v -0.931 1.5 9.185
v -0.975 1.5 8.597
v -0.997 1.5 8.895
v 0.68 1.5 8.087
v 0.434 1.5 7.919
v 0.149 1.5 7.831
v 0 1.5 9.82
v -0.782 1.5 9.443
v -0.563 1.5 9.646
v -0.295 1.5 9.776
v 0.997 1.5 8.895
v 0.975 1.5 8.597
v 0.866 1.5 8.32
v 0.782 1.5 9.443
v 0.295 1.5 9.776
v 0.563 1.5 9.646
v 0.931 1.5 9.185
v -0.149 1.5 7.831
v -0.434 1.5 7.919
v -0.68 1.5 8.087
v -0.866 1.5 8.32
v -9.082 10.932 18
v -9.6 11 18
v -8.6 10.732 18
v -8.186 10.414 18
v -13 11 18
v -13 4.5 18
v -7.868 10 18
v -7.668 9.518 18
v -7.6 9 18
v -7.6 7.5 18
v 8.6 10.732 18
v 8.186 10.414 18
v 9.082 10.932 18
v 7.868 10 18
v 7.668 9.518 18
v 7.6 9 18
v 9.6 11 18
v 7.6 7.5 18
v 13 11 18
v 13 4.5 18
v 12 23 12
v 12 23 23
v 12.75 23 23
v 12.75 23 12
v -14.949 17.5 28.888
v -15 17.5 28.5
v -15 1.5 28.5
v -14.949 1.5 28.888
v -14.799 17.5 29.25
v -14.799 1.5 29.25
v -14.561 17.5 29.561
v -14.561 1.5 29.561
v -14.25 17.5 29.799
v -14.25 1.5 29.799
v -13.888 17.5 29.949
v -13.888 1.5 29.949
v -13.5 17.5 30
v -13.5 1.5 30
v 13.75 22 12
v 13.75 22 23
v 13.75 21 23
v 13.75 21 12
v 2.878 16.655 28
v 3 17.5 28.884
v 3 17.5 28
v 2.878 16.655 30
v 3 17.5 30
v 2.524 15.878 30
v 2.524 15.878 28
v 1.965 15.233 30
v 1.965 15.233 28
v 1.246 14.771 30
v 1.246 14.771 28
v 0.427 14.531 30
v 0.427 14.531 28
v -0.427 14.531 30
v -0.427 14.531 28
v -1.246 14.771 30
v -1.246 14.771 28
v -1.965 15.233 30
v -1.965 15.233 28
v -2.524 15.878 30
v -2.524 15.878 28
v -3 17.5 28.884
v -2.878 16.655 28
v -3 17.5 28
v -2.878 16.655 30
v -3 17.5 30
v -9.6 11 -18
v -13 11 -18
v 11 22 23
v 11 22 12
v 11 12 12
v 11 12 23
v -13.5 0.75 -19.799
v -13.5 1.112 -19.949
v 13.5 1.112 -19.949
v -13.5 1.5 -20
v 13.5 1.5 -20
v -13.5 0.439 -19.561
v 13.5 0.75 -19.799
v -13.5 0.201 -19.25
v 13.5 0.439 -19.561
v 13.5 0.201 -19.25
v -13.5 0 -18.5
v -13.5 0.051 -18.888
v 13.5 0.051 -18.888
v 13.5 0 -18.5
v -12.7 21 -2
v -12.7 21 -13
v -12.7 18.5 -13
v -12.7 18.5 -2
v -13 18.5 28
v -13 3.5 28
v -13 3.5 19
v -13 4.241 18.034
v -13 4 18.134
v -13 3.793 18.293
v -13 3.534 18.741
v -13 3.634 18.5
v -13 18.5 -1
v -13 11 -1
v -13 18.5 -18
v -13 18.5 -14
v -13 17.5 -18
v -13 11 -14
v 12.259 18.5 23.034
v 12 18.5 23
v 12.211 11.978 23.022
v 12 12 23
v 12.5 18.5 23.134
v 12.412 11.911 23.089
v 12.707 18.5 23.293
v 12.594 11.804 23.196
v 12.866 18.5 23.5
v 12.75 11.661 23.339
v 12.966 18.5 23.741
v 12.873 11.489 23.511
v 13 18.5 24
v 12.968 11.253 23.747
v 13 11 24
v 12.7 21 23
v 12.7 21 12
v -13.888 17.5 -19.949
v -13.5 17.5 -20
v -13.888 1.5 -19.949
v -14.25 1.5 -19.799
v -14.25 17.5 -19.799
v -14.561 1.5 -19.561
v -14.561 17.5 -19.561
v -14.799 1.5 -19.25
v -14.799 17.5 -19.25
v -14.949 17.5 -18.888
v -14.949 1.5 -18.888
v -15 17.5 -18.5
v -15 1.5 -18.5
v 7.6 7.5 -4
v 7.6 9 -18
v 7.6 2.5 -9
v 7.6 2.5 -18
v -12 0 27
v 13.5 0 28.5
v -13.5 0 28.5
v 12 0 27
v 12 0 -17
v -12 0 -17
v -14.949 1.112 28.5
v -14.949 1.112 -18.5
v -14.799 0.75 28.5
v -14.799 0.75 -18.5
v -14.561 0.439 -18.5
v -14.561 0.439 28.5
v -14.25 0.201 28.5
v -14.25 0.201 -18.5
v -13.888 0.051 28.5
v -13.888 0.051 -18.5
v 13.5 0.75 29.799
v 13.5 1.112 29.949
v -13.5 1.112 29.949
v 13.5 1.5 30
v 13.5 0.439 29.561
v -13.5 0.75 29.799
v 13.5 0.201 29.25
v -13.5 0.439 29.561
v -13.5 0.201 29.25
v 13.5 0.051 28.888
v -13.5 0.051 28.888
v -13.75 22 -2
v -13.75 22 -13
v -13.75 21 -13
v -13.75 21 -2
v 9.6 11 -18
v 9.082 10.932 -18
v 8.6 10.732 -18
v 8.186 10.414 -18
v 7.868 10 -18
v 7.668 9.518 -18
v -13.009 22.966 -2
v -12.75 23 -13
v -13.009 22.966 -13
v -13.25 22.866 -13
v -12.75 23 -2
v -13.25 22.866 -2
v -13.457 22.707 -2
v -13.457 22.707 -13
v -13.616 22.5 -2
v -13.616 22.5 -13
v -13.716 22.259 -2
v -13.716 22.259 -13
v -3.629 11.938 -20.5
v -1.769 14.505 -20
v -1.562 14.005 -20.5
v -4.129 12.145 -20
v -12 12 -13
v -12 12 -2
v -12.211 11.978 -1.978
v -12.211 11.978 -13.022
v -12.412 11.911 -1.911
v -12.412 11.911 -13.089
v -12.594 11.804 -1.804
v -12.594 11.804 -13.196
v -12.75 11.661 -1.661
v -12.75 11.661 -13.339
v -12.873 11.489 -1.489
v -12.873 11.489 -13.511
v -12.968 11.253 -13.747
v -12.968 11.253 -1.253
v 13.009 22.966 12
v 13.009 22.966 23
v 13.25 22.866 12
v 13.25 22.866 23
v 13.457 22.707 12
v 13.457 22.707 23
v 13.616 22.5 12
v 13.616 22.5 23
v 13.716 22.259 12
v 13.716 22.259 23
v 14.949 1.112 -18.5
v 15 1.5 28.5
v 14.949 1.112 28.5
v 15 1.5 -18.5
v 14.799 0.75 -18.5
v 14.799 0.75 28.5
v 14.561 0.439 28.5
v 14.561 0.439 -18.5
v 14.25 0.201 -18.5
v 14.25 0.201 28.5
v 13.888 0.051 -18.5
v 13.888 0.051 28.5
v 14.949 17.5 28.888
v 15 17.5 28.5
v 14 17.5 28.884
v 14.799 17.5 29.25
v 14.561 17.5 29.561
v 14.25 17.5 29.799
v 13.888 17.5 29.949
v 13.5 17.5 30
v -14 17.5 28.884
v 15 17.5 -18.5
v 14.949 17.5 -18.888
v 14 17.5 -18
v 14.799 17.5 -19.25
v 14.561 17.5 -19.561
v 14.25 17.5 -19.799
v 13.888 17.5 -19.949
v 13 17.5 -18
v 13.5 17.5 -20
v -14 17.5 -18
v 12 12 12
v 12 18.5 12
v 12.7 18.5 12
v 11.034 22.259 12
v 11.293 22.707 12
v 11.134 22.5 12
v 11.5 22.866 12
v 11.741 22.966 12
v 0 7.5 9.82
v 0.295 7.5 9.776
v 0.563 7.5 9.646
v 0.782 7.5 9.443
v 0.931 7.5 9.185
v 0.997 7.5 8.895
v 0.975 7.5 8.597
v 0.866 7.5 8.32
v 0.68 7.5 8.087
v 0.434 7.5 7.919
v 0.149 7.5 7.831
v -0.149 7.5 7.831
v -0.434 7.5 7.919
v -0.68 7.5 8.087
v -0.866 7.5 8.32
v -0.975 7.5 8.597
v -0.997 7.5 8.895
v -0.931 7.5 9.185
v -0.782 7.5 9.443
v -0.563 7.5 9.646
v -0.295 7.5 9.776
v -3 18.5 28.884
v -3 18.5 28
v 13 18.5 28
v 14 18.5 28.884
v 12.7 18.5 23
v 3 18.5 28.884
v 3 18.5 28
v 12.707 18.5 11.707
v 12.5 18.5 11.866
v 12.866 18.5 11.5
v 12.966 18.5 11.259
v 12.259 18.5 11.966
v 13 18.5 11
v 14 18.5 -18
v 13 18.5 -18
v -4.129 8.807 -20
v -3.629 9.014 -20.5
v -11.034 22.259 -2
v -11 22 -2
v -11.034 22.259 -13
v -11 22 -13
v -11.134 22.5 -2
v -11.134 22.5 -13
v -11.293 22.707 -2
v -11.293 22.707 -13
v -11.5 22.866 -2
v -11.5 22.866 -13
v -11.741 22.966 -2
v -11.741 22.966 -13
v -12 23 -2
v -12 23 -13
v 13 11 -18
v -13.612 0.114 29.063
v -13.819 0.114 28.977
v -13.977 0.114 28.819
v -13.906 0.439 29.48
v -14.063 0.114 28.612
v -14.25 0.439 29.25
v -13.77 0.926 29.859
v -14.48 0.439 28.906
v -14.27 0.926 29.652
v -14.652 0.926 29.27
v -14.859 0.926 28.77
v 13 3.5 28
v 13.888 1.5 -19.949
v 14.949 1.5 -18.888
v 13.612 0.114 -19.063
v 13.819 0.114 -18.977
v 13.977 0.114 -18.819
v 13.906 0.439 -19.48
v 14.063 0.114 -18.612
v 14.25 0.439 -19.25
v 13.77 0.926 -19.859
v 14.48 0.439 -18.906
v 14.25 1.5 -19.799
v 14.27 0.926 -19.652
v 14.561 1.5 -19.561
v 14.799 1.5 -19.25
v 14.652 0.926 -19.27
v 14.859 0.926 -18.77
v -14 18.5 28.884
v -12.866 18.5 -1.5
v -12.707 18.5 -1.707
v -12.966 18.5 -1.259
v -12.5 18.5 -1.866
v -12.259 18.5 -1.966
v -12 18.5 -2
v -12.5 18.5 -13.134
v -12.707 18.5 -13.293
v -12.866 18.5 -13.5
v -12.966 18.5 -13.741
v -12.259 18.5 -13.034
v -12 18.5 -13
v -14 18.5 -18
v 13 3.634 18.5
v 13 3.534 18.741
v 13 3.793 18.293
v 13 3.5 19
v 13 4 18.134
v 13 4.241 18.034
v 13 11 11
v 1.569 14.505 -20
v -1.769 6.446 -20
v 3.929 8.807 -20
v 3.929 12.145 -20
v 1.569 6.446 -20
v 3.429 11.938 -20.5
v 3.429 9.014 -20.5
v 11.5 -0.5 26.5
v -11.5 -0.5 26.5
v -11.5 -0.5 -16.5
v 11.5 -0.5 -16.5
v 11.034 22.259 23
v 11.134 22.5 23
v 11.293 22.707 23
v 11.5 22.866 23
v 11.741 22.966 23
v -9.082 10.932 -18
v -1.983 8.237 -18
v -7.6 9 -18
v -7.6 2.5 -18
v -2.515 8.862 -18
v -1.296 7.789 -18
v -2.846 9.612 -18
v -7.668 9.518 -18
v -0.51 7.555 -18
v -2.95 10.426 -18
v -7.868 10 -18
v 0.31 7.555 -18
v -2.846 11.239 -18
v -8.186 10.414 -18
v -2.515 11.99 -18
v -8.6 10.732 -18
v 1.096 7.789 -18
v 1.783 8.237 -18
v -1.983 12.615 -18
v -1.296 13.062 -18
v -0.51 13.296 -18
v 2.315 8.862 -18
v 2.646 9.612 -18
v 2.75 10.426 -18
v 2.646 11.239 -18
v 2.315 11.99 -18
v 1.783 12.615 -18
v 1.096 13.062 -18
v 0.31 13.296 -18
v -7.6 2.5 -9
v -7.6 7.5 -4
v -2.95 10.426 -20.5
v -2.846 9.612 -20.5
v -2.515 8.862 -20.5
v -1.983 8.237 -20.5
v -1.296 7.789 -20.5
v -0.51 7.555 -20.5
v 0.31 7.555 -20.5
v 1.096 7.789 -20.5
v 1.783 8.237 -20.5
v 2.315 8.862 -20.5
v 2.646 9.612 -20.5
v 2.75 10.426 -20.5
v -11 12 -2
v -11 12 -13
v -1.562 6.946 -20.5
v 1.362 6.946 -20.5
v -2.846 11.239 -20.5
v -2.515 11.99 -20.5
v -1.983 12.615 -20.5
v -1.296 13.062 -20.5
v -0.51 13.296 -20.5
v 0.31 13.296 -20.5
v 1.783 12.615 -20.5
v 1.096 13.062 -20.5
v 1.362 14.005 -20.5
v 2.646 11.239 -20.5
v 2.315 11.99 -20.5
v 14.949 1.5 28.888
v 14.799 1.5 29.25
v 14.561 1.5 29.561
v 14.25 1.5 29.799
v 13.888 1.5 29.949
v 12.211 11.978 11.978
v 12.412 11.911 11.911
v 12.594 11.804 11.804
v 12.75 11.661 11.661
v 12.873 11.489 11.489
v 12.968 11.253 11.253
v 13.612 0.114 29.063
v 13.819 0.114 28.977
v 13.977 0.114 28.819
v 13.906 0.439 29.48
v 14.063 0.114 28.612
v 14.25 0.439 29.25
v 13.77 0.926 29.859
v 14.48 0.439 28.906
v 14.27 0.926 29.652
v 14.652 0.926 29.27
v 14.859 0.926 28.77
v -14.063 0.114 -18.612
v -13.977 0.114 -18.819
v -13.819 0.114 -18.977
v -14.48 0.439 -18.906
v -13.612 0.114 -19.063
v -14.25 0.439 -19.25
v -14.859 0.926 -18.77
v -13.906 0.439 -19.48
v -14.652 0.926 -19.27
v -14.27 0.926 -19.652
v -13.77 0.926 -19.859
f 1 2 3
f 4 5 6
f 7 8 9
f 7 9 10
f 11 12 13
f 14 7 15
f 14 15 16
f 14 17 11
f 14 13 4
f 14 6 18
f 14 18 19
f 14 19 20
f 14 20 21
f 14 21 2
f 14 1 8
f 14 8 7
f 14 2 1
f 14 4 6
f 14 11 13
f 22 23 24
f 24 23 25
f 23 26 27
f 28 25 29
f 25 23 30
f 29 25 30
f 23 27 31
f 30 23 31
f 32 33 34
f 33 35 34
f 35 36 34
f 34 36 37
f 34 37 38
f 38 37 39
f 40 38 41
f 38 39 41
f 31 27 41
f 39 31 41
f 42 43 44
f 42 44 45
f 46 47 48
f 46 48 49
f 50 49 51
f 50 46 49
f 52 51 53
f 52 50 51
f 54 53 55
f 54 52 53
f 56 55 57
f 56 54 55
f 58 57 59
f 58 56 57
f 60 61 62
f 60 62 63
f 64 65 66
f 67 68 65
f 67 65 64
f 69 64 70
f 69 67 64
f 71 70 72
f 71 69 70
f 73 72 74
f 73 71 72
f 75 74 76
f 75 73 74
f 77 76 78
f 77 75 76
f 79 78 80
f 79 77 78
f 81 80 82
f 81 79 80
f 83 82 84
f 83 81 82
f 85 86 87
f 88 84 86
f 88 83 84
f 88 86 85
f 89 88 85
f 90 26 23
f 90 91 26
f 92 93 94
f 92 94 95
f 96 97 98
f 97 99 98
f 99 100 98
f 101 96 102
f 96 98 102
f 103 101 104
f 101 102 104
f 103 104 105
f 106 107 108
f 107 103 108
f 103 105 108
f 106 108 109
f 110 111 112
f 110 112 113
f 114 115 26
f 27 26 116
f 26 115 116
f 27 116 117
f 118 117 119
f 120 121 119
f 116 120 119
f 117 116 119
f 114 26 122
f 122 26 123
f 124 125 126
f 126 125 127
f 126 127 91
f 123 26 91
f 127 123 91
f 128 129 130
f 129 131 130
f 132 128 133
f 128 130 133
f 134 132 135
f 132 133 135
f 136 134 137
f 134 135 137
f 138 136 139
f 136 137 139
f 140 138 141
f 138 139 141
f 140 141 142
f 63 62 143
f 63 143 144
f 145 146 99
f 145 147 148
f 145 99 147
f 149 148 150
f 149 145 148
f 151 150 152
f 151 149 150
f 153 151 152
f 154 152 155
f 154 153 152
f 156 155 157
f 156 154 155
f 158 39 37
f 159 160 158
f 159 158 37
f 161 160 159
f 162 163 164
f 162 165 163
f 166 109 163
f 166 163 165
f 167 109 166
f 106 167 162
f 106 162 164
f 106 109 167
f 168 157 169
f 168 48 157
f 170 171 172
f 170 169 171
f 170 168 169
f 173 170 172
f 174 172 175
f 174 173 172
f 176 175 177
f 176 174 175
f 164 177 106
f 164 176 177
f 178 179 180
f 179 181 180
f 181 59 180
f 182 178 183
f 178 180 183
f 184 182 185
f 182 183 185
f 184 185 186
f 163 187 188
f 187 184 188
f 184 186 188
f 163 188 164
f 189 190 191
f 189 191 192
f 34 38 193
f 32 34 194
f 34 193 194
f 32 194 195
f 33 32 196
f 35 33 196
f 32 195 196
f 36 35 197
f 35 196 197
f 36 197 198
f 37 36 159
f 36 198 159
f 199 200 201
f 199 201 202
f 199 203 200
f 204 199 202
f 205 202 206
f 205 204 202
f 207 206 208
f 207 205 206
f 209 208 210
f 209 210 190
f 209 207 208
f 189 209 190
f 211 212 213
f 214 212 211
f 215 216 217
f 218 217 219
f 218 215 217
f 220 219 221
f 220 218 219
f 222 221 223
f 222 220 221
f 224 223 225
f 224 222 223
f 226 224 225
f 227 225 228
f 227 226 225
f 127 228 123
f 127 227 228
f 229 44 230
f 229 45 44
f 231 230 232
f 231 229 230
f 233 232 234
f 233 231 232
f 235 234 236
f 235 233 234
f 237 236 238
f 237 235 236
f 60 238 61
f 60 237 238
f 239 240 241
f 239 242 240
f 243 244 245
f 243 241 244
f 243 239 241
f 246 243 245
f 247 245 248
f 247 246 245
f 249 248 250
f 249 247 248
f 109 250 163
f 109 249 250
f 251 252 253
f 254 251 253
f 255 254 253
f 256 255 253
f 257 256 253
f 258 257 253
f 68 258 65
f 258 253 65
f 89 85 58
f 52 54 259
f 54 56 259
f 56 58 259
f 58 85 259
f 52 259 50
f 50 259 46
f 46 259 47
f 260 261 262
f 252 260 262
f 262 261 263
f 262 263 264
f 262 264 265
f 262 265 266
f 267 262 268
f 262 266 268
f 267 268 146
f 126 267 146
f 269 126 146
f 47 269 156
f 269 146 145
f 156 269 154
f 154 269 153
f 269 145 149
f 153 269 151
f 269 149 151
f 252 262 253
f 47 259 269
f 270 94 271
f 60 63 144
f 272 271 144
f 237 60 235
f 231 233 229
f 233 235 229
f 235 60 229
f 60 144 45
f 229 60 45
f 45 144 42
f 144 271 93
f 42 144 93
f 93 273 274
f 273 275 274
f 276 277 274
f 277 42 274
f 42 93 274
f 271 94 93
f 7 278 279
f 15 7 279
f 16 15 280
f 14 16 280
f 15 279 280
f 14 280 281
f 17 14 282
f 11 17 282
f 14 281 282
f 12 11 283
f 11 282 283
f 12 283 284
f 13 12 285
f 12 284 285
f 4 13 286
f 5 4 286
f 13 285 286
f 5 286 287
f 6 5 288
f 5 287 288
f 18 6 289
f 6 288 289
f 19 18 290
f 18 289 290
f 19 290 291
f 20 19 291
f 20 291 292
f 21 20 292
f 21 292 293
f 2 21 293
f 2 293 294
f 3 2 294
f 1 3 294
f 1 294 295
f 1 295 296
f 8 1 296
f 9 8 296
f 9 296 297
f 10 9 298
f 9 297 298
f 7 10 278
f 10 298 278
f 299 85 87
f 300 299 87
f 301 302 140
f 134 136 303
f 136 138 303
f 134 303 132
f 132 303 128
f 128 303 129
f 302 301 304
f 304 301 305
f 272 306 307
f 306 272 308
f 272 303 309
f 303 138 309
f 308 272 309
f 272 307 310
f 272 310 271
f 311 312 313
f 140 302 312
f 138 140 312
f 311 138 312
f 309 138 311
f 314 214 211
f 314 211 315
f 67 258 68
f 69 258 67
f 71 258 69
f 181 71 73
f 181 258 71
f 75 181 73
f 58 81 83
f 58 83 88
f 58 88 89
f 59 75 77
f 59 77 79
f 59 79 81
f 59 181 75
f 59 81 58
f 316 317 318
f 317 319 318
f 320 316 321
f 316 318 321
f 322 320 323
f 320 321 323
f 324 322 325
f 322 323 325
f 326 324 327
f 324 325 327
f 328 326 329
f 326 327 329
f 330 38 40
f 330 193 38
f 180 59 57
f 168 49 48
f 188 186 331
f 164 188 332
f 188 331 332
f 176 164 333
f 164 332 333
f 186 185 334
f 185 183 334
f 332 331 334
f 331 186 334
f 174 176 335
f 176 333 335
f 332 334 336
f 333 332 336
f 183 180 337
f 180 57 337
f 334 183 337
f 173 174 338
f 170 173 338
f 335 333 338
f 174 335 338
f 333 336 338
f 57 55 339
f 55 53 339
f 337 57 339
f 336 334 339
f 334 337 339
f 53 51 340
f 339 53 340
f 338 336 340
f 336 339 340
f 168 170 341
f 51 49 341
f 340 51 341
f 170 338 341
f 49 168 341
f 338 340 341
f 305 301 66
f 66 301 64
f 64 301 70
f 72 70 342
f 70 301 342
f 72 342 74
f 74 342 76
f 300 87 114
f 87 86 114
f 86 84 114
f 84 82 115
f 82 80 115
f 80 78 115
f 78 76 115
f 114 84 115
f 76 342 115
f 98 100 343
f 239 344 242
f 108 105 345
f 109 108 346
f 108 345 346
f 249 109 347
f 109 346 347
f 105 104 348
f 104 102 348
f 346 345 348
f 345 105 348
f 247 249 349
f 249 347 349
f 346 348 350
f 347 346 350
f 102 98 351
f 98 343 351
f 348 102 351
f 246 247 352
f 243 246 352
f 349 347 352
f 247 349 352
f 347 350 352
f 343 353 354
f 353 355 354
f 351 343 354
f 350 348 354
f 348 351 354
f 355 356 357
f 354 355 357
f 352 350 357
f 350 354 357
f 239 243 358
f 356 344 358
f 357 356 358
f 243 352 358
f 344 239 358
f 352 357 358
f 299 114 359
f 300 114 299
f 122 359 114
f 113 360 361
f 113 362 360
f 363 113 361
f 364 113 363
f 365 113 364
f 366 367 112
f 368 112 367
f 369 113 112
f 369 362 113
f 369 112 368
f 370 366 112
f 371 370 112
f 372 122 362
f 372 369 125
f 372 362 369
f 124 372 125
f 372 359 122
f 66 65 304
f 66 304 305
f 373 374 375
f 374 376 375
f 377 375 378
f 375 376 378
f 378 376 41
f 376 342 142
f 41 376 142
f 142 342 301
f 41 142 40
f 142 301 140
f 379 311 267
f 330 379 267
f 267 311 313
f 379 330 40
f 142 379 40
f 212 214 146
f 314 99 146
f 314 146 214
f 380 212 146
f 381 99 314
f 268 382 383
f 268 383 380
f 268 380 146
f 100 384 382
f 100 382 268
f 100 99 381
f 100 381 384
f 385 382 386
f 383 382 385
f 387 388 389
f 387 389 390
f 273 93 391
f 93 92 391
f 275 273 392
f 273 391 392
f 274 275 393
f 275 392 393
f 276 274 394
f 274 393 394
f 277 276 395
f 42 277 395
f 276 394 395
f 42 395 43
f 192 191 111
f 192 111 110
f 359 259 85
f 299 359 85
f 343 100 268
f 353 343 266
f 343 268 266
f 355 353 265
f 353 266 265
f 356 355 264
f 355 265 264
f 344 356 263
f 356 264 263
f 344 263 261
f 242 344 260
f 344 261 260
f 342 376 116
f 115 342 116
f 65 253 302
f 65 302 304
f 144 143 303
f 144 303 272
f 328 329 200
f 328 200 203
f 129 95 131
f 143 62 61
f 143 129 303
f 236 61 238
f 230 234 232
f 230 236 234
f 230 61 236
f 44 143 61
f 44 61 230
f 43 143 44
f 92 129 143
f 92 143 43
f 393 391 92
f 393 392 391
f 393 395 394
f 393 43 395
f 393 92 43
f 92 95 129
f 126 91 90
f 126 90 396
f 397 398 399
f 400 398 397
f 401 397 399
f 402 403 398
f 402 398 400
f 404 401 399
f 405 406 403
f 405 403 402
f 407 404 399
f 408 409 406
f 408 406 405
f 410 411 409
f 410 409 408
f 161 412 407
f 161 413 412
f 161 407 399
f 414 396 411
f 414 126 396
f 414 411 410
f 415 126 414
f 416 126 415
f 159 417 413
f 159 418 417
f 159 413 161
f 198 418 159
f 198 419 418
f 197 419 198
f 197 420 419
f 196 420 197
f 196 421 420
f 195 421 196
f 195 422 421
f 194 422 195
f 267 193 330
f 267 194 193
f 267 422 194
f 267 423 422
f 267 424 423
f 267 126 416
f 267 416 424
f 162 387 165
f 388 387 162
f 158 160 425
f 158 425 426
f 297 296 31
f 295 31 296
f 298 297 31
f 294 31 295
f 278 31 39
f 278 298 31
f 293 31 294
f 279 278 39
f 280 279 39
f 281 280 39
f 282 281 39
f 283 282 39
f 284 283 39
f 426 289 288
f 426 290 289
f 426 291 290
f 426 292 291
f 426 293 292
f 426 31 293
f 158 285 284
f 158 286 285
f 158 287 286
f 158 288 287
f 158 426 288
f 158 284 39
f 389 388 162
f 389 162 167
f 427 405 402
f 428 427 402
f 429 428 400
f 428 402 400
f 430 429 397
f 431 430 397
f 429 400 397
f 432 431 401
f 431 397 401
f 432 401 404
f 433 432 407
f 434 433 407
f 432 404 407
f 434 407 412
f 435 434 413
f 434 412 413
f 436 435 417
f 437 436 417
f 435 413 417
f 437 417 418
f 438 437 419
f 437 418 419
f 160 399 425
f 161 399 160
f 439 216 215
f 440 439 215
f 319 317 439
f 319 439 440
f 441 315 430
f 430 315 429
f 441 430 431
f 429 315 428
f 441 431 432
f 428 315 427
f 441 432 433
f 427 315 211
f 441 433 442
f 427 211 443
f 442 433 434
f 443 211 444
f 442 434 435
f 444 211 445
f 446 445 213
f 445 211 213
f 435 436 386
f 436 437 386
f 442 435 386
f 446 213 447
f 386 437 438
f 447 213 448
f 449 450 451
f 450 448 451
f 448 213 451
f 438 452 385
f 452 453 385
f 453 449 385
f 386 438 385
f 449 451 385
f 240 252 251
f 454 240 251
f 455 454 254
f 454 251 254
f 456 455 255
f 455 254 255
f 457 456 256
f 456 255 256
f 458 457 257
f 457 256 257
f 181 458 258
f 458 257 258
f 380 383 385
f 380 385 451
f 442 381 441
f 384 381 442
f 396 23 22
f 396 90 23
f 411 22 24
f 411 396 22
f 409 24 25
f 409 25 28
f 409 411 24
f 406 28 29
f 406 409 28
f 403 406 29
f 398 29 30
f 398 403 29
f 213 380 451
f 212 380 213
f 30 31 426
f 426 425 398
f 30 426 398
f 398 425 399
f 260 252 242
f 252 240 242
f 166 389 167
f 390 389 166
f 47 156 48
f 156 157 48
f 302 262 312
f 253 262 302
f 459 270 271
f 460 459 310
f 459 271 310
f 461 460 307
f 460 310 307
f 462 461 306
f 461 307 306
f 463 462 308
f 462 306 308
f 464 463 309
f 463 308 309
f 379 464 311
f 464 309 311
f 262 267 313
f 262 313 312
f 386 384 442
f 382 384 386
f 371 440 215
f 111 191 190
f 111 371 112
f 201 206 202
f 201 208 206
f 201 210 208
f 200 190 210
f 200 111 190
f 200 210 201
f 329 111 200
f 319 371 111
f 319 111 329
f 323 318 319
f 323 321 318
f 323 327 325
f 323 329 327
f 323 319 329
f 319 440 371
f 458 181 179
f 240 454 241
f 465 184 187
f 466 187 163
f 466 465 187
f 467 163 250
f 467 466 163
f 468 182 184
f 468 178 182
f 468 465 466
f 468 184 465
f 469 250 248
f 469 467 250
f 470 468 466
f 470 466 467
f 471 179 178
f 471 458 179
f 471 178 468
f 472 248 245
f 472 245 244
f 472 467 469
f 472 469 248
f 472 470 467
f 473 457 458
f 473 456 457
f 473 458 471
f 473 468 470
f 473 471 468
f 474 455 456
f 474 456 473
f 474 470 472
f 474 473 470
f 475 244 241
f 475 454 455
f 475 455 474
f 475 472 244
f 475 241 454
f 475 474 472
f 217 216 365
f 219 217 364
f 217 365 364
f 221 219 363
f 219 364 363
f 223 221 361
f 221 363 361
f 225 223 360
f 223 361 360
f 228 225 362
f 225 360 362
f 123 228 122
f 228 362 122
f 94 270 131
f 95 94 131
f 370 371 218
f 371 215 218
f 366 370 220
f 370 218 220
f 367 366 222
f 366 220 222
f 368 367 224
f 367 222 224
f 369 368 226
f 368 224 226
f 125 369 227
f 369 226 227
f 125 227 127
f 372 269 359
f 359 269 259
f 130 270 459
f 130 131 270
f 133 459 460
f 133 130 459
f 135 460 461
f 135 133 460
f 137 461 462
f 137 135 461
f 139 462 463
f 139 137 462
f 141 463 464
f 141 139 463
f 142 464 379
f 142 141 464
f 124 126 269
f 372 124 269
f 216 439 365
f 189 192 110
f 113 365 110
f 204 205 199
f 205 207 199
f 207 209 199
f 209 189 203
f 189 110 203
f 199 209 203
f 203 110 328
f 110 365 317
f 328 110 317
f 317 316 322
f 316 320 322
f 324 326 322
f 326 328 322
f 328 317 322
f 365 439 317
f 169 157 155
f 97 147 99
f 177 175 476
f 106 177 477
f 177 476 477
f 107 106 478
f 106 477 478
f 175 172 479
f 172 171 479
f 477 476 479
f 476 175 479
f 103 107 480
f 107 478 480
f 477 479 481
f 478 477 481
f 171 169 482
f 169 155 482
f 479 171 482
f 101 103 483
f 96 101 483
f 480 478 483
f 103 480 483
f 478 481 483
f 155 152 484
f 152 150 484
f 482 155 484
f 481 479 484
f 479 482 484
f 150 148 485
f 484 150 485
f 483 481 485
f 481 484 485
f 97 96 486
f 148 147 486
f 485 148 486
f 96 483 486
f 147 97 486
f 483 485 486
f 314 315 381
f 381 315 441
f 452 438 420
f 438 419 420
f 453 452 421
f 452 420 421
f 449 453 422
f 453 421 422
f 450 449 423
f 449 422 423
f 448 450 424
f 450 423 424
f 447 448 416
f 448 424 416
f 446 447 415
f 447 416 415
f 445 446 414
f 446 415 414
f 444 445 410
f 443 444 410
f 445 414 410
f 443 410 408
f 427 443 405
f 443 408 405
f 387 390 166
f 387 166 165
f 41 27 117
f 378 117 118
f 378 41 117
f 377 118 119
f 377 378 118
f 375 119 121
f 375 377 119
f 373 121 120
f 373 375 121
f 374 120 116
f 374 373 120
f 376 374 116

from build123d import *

# Parameters (mm, degrees)
BOSS_EXTRUDE1_DEPTH      = 17.5
CUT_EXTRUDE1_DEPTH       = 14
CUT_EXTRUDE2_DEPTH       = 54.247065647
SKETCH4_W                = 26
SKETCH4_H                = 8
CUT_EXTRUDE3_DEPTH       = 1
BOSS_EXTRUDE3_DEPTH      = 7.5
BOSS_EXTRUDE3_DEPTH_BACK = 1
SKETCH6_W                = 5.4
SKETCH6_H                = 36
FILLET2_R                = 2
FILLET5_R                = 1.5
SKETCH13_W               = 15.2
SKETCH13_H               = 28
BOSS_EXTRUDE7_DEPTH      = 4
SKETCH15_R               = 1
CUT_EXTRUDE8_DEPTH       = 6
CHAMFER5_SIZE            = 6
SKETCH16_W               = 11
SKETCH16_H               = 5.5
BOSS_EXTRUDE8_DEPTH      = 2
SKETCH17_W               = 11
SKETCH17_H               = 5.5
BOSS_EXTRUDE9_DEPTH      = 2
BOSS_EXTRUDE14_START     = -2
BOSS_EXTRUDE14_DEPTH     = 0.5
CHAMFER6_SIZE            = 0.5
BOSS_EXTRUDE15_DEPTH     = 0.5
CHAMFER7_SIZE            = 0.5
CUT_EXTRUDE9_REACH       = 59.483
BOSS_EXTRUDE16_DEPTH     = 1
FILLET7_R                = 1
SKETCH27_W               = 11
SKETCH27_H               = 2
BOSS_EXTRUDE17_DEPTH     = 0.75
SKETCH27_3_W             = 11
SKETCH27_3_H             = 2.5
CUT_EXTRUDE10_DEPTH      = 0.3
SKETCH29_W               = 11
SKETCH29_H               = 2
BOSS_EXTRUDE18_DEPTH     = 0.75
SKETCH29_4_W             = 11
SKETCH29_4_H             = 2.5
CUT_EXTRUDE11_DEPTH      = 0.3
FILLET8_R                = 1


# Some blends are built 0.0001 mm under size
with BuildPart() as part:
    # Sketch1 → Boss-Extrude1 (new body)
    with BuildSketch(Plane(origin=(0, 0, 0), x_dir=(1, 0, 0), z_dir=(0, 1, 0))):
        Polygon((-15, 20), (15, 20), (15, -20), (15, -30), (-15, -30), (-15, -20), align=None)
    extrude(amount=BOSS_EXTRUDE1_DEPTH)

    # Sketch2 → Cut-Extrude1 (cut)
    with BuildSketch(Plane(origin=(0, 17.5, 0), x_dir=(1, 0, 0), z_dir=(0, 1, 0))):
        Polygon((-13, 18), (13, 18), (13, -18), (13, -28), (-13, -28), (-13, -18), align=None)
    extrude(amount=-CUT_EXTRUDE1_DEPTH, mode=Mode.SUBTRACT)

    # Sketch3 → Cut-Extrude2 (cut, through all)
    with BuildSketch(Plane.XY.offset(-18)):
        with BuildLine():
            ThreePointArc((2.74956137, 10.425664385), (-0.1, 13.325664385), (-2.94956137, 10.425664385))
            ThreePointArc((-2.94956137, 10.425664385), (-0.1, 7.525664385), (2.74956137, 10.425664385))
        make_face()
    extrude(amount=-CUT_EXTRUDE2_DEPTH, mode=Mode.SUBTRACT)

    # Sketch4 → Cut-Extrude3 (cut)
    with BuildSketch(Plane(origin=(0, 3.5, 0), x_dir=(1, 0, 0), z_dir=(0, 1, 0))):
        with Locations((0, 14)):
            Rectangle(SKETCH4_W, SKETCH4_H)
    extrude(amount=-CUT_EXTRUDE3_DEPTH, mode=Mode.SUBTRACT)

    # Sketch6 → Boss-Extrude3 (add, two sides: drawn at the far end of the back side and taken through both)
    with BuildSketch(Plane(origin=(0, 3.5, 0), x_dir=(1, 0, 0), z_dir=(0, 1, 0)).offset(-BOSS_EXTRUDE3_DEPTH_BACK)):
        with Locations((-10.3, 0)):
            Rectangle(SKETCH6_W, SKETCH6_H)
        with Locations((10.3, 0)):
            Rectangle(SKETCH6_W, SKETCH6_H)
    extrude(amount=BOSS_EXTRUDE3_DEPTH + BOSS_EXTRUDE3_DEPTH_BACK)

    # Fillet2
    fillet2_edges = [part.edges().sort_by_distance(p)[0] for p in [
        (-7.6, 11, 0),
        (7.6, 11, 0),
    ]]
    fillet(fillet2_edges, radius=FILLET2_R)

    # Fillet5
    fillet5_edges = [part.edges().sort_by_distance(p)[0] for p in [
        (15, 8.75, 30),
        (-15, 8.75, 30),
        (-15, 8.75, -20),
        (15, 8.75, -20),
        (0, 0, 30),
        (-15, 0, 5),
        (0, 0, -20),
        (15, 0, 5),
    ]]
    fillet(fillet5_edges, radius=FILLET5_R)

    # Sketch13 → Boss-Extrude7 (add)
    with BuildSketch(Plane(origin=(0, 3.5, 0), x_dir=(1, 0, 0), z_dir=(0, 1, 0))):
        with Locations((0, -4)):
            Rectangle(SKETCH13_W, SKETCH13_H)
    extrude(amount=BOSS_EXTRUDE7_DEPTH)

    # Sketch15 → Cut-Extrude8 (cut)
    with BuildSketch(Plane(origin=(0, 7.5, 0), x_dir=(1, 0, 0), z_dir=(0, 1, 0))):
        with Locations(Location((0, -8.82, 0), (0, 0, 270))):
            Circle(SKETCH15_R)
    extrude(amount=-CUT_EXTRUDE8_DEPTH, mode=Mode.SUBTRACT)

    # Chamfer5
    # the kernel refuses this chamfer: 6 mm, written as the material it takes off along each edge
    with BuildSketch(Plane(origin=(-7.6, 7.5, -10), x_dir=(0, -0.9996219169112968, -0.02749587661058649), z_dir=(1, 0, 0))) as chamfer5_piece_1_section:
        Polygon((CHAMFER5_SIZE * 0.999621916911, -CHAMFER5_SIZE * 0.0274958766106), (-CHAMFER5_SIZE * 0.0274958766106, -CHAMFER5_SIZE * 0.999621916911), (0, 0), align=None)
    chamfer5_piece_1 = extrude(amount=15.2, mode=Mode.PRIVATE)
    chamfer5_piece_1 = split(chamfer5_piece_1, bisect_by=Plane(origin=(0, 2.5, -7.952380952), z_dir=(0, 1, 0)), keep=Keep.TOP, mode=Mode.PRIVATE)
    add(chamfer5_piece_1, mode=Mode.SUBTRACT)

    # Sketch16 → Boss-Extrude8 (add)
    with BuildSketch(Plane(origin=(-13, 0, 0), x_dir=(0, 0, -1), z_dir=(1, 0, 0))):
        Polygon((2, 17.5), (2, 14.5), (2, 12), (13, 12), (13, 14.5), (13, 17.5), align=None)
        with Locations((7.5, 20.25)):
            Rectangle(SKETCH16_W, SKETCH16_H)
    extrude(amount=BOSS_EXTRUDE8_DEPTH)

    # Sketch17 → Boss-Extrude9 (add)
    with BuildSketch(Plane.ZY.offset(-13)):
        with Locations((17.5, 20.25)):
            Rectangle(SKETCH17_W, SKETCH17_H)
        Polygon((12, 17.5), (12, 14.5), (12, 12), (23, 12), (23, 14.5), (23, 17.5), align=None)
    extrude(amount=BOSS_EXTRUDE9_DEPTH)

    # Sketch3<4> → Boss-Extrude14 (add)
    with BuildSketch(Plane.XY.offset(-18).offset(BOSS_EXTRUDE14_START)):
        Polygon((-4.129390667, 8.806636123), (-1.769028262, 6.446273719), (1.569028262, 6.446273719), (3.929390667, 8.806636123), (3.929390667, 12.144692648), (1.569028262, 14.505055052), (-1.769028262, 14.505055052), (-4.129390667, 12.144692648), align=None)
        with BuildLine():
            ThreePointArc((-2.94956137, 10.425664385), (-0.1, 7.525664385), (2.74956137, 10.425664385))
            ThreePointArc((2.74956137, 10.425664385), (-0.1, 13.325664385), (-2.94956137, 10.425664385))
        make_face(mode=Mode.SUBTRACT)
    extrude(amount=-BOSS_EXTRUDE14_DEPTH)

    # Chamfer6
    chamfer6_edges = [part.edges().sort_by_distance(p)[0] for p in [
        (2.749209465, 13.32487385, -20.5),
        (3.929390667, 10.475664385, -20.5),
        (2.749209465, 7.626454921, -20.5),
        (-0.1, 6.446273719, -20.5),
        (-2.949209465, 7.626454921, -20.5),
        (-4.129390667, 10.475664385, -20.5),
        (-2.949209465, 13.32487385, -20.5),
        (-0.1, 14.505055052, -20.5),
    ]]
    chamfer(chamfer6_edges, length=CHAMFER6_SIZE - 0.0001)  # a hair under: the kernel refuses the full size

    # Sketch23 → Boss-Extrude15 (add)
    with BuildSketch(Plane.XZ):
        Polygon((-12, 17), (-12, -17), (12, -17), (12, 17), (12, 27), (-12, 27), align=None)
    extrude(amount=BOSS_EXTRUDE15_DEPTH)

    # Chamfer7
    chamfer7_edges = [part.edges().sort_by_distance(p)[0] for p in [
        (12, -0.5, 5),
        (-12, -0.5, 5),
        (0, -0.5, -17),
        (0, -0.5, 27),
    ]]
    chamfer(chamfer7_edges, length=CHAMFER7_SIZE - 0.0001)  # a hair under: the kernel refuses the full size

    # Sketch24 → Cut-Extrude9 (cut, up to next)
    with BuildSketch(Plane.XY.offset(30), mode=Mode.PRIVATE) as cut_extrude9_sk1:
        with BuildLine():
            Line((-3, 17.5), (3, 17.5))
            ThreePointArc((3, 17.5), (0, 14.5), (-3, 17.5))
        make_face()
    cut_extrude9_tool1 = extrude(cut_extrude9_sk1.sketch, amount=-CUT_EXTRUDE9_REACH, mode=Mode.PRIVATE) & part.part
    add(cut_extrude9_tool1.solids().sort_by_distance((0, 16.22676, 30))[0], mode=Mode.SUBTRACT)

    # Sketch26 → Boss-Extrude16 (add)
    with BuildSketch(Plane(origin=(0, 17.5, 0), x_dir=(1, 0, 0), z_dir=(0, 1, 0))):
        Polygon((-13, 13), (-13, 18), (-14, 18), (-14, -19.115845085), (-14, -28.884154915), (-3, -28.884154915), (-3, -28), (-13, -28), (-13, 2), align=None)
        Polygon((3, -28), (13, -28), (13, 18), (14, 18), (14, -28.884154915), (3, -28.884154915), align=None)
    extrude(amount=BOSS_EXTRUDE16_DEPTH)

    # Fillet7
    fillet7_edges = [part.edges().sort_by_distance(p)[0] for p in [
        (-13, 15.25, -13),
        (-13, 15.25, -2),
        (-13, 12, -7.5),
        (13, 15.25, 12),
        (13, 12, 17.5),
        (13, 15.25, 23),
        (0, 3.5, 18),
    ]]
    fillet(fillet7_edges, radius=FILLET7_R - 0.0001)  # a hair under: the kernel refuses the full size

    # Sketch27 → Boss-Extrude17 (add)
    with BuildSketch(Plane.ZY.offset(13)):
        with Locations((-7.5, 22)):
            Rectangle(SKETCH27_W, SKETCH27_H)
    extrude(amount=BOSS_EXTRUDE17_DEPTH)

    # Sketch27<3> → Cut-Extrude10 (cut)
    with BuildSketch(Plane.ZY.offset(13)):
        with Locations((-7.5, 19.75)):
            Rectangle(SKETCH27_3_W, SKETCH27_3_H)
    extrude(amount=-CUT_EXTRUDE10_DEPTH, mode=Mode.SUBTRACT)

    # Sketch29 → Boss-Extrude18 (add)
    with BuildSketch(Plane(origin=(13, 0, 0), x_dir=(0, 0, -1), z_dir=(1, 0, 0))):
        with Locations((-17.5, 22)):
            Rectangle(SKETCH29_W, SKETCH29_H)
    extrude(amount=BOSS_EXTRUDE18_DEPTH)

    # Sketch29<4> → Cut-Extrude11 (cut)
    with BuildSketch(Plane(origin=(13, 0, 0), x_dir=(0, 0, -1), z_dir=(1, 0, 0))):
        with Locations((-17.5, 19.75)):
            Rectangle(SKETCH29_4_W, SKETCH29_4_H)
    extrude(amount=-CUT_EXTRUDE11_DEPTH, mode=Mode.SUBTRACT)

    # Fillet8
    fillet8_edges = [part.edges().sort_by_distance(p)[0] for p in [
        (-11, 23, -7.5),
        (11, 23, 17.5),
        (-13.75, 23, -7.5),
        (13.75, 23, 17.5),
    ]]
    fillet(fillet8_edges, radius=FILLET8_R)


solid = part.part
